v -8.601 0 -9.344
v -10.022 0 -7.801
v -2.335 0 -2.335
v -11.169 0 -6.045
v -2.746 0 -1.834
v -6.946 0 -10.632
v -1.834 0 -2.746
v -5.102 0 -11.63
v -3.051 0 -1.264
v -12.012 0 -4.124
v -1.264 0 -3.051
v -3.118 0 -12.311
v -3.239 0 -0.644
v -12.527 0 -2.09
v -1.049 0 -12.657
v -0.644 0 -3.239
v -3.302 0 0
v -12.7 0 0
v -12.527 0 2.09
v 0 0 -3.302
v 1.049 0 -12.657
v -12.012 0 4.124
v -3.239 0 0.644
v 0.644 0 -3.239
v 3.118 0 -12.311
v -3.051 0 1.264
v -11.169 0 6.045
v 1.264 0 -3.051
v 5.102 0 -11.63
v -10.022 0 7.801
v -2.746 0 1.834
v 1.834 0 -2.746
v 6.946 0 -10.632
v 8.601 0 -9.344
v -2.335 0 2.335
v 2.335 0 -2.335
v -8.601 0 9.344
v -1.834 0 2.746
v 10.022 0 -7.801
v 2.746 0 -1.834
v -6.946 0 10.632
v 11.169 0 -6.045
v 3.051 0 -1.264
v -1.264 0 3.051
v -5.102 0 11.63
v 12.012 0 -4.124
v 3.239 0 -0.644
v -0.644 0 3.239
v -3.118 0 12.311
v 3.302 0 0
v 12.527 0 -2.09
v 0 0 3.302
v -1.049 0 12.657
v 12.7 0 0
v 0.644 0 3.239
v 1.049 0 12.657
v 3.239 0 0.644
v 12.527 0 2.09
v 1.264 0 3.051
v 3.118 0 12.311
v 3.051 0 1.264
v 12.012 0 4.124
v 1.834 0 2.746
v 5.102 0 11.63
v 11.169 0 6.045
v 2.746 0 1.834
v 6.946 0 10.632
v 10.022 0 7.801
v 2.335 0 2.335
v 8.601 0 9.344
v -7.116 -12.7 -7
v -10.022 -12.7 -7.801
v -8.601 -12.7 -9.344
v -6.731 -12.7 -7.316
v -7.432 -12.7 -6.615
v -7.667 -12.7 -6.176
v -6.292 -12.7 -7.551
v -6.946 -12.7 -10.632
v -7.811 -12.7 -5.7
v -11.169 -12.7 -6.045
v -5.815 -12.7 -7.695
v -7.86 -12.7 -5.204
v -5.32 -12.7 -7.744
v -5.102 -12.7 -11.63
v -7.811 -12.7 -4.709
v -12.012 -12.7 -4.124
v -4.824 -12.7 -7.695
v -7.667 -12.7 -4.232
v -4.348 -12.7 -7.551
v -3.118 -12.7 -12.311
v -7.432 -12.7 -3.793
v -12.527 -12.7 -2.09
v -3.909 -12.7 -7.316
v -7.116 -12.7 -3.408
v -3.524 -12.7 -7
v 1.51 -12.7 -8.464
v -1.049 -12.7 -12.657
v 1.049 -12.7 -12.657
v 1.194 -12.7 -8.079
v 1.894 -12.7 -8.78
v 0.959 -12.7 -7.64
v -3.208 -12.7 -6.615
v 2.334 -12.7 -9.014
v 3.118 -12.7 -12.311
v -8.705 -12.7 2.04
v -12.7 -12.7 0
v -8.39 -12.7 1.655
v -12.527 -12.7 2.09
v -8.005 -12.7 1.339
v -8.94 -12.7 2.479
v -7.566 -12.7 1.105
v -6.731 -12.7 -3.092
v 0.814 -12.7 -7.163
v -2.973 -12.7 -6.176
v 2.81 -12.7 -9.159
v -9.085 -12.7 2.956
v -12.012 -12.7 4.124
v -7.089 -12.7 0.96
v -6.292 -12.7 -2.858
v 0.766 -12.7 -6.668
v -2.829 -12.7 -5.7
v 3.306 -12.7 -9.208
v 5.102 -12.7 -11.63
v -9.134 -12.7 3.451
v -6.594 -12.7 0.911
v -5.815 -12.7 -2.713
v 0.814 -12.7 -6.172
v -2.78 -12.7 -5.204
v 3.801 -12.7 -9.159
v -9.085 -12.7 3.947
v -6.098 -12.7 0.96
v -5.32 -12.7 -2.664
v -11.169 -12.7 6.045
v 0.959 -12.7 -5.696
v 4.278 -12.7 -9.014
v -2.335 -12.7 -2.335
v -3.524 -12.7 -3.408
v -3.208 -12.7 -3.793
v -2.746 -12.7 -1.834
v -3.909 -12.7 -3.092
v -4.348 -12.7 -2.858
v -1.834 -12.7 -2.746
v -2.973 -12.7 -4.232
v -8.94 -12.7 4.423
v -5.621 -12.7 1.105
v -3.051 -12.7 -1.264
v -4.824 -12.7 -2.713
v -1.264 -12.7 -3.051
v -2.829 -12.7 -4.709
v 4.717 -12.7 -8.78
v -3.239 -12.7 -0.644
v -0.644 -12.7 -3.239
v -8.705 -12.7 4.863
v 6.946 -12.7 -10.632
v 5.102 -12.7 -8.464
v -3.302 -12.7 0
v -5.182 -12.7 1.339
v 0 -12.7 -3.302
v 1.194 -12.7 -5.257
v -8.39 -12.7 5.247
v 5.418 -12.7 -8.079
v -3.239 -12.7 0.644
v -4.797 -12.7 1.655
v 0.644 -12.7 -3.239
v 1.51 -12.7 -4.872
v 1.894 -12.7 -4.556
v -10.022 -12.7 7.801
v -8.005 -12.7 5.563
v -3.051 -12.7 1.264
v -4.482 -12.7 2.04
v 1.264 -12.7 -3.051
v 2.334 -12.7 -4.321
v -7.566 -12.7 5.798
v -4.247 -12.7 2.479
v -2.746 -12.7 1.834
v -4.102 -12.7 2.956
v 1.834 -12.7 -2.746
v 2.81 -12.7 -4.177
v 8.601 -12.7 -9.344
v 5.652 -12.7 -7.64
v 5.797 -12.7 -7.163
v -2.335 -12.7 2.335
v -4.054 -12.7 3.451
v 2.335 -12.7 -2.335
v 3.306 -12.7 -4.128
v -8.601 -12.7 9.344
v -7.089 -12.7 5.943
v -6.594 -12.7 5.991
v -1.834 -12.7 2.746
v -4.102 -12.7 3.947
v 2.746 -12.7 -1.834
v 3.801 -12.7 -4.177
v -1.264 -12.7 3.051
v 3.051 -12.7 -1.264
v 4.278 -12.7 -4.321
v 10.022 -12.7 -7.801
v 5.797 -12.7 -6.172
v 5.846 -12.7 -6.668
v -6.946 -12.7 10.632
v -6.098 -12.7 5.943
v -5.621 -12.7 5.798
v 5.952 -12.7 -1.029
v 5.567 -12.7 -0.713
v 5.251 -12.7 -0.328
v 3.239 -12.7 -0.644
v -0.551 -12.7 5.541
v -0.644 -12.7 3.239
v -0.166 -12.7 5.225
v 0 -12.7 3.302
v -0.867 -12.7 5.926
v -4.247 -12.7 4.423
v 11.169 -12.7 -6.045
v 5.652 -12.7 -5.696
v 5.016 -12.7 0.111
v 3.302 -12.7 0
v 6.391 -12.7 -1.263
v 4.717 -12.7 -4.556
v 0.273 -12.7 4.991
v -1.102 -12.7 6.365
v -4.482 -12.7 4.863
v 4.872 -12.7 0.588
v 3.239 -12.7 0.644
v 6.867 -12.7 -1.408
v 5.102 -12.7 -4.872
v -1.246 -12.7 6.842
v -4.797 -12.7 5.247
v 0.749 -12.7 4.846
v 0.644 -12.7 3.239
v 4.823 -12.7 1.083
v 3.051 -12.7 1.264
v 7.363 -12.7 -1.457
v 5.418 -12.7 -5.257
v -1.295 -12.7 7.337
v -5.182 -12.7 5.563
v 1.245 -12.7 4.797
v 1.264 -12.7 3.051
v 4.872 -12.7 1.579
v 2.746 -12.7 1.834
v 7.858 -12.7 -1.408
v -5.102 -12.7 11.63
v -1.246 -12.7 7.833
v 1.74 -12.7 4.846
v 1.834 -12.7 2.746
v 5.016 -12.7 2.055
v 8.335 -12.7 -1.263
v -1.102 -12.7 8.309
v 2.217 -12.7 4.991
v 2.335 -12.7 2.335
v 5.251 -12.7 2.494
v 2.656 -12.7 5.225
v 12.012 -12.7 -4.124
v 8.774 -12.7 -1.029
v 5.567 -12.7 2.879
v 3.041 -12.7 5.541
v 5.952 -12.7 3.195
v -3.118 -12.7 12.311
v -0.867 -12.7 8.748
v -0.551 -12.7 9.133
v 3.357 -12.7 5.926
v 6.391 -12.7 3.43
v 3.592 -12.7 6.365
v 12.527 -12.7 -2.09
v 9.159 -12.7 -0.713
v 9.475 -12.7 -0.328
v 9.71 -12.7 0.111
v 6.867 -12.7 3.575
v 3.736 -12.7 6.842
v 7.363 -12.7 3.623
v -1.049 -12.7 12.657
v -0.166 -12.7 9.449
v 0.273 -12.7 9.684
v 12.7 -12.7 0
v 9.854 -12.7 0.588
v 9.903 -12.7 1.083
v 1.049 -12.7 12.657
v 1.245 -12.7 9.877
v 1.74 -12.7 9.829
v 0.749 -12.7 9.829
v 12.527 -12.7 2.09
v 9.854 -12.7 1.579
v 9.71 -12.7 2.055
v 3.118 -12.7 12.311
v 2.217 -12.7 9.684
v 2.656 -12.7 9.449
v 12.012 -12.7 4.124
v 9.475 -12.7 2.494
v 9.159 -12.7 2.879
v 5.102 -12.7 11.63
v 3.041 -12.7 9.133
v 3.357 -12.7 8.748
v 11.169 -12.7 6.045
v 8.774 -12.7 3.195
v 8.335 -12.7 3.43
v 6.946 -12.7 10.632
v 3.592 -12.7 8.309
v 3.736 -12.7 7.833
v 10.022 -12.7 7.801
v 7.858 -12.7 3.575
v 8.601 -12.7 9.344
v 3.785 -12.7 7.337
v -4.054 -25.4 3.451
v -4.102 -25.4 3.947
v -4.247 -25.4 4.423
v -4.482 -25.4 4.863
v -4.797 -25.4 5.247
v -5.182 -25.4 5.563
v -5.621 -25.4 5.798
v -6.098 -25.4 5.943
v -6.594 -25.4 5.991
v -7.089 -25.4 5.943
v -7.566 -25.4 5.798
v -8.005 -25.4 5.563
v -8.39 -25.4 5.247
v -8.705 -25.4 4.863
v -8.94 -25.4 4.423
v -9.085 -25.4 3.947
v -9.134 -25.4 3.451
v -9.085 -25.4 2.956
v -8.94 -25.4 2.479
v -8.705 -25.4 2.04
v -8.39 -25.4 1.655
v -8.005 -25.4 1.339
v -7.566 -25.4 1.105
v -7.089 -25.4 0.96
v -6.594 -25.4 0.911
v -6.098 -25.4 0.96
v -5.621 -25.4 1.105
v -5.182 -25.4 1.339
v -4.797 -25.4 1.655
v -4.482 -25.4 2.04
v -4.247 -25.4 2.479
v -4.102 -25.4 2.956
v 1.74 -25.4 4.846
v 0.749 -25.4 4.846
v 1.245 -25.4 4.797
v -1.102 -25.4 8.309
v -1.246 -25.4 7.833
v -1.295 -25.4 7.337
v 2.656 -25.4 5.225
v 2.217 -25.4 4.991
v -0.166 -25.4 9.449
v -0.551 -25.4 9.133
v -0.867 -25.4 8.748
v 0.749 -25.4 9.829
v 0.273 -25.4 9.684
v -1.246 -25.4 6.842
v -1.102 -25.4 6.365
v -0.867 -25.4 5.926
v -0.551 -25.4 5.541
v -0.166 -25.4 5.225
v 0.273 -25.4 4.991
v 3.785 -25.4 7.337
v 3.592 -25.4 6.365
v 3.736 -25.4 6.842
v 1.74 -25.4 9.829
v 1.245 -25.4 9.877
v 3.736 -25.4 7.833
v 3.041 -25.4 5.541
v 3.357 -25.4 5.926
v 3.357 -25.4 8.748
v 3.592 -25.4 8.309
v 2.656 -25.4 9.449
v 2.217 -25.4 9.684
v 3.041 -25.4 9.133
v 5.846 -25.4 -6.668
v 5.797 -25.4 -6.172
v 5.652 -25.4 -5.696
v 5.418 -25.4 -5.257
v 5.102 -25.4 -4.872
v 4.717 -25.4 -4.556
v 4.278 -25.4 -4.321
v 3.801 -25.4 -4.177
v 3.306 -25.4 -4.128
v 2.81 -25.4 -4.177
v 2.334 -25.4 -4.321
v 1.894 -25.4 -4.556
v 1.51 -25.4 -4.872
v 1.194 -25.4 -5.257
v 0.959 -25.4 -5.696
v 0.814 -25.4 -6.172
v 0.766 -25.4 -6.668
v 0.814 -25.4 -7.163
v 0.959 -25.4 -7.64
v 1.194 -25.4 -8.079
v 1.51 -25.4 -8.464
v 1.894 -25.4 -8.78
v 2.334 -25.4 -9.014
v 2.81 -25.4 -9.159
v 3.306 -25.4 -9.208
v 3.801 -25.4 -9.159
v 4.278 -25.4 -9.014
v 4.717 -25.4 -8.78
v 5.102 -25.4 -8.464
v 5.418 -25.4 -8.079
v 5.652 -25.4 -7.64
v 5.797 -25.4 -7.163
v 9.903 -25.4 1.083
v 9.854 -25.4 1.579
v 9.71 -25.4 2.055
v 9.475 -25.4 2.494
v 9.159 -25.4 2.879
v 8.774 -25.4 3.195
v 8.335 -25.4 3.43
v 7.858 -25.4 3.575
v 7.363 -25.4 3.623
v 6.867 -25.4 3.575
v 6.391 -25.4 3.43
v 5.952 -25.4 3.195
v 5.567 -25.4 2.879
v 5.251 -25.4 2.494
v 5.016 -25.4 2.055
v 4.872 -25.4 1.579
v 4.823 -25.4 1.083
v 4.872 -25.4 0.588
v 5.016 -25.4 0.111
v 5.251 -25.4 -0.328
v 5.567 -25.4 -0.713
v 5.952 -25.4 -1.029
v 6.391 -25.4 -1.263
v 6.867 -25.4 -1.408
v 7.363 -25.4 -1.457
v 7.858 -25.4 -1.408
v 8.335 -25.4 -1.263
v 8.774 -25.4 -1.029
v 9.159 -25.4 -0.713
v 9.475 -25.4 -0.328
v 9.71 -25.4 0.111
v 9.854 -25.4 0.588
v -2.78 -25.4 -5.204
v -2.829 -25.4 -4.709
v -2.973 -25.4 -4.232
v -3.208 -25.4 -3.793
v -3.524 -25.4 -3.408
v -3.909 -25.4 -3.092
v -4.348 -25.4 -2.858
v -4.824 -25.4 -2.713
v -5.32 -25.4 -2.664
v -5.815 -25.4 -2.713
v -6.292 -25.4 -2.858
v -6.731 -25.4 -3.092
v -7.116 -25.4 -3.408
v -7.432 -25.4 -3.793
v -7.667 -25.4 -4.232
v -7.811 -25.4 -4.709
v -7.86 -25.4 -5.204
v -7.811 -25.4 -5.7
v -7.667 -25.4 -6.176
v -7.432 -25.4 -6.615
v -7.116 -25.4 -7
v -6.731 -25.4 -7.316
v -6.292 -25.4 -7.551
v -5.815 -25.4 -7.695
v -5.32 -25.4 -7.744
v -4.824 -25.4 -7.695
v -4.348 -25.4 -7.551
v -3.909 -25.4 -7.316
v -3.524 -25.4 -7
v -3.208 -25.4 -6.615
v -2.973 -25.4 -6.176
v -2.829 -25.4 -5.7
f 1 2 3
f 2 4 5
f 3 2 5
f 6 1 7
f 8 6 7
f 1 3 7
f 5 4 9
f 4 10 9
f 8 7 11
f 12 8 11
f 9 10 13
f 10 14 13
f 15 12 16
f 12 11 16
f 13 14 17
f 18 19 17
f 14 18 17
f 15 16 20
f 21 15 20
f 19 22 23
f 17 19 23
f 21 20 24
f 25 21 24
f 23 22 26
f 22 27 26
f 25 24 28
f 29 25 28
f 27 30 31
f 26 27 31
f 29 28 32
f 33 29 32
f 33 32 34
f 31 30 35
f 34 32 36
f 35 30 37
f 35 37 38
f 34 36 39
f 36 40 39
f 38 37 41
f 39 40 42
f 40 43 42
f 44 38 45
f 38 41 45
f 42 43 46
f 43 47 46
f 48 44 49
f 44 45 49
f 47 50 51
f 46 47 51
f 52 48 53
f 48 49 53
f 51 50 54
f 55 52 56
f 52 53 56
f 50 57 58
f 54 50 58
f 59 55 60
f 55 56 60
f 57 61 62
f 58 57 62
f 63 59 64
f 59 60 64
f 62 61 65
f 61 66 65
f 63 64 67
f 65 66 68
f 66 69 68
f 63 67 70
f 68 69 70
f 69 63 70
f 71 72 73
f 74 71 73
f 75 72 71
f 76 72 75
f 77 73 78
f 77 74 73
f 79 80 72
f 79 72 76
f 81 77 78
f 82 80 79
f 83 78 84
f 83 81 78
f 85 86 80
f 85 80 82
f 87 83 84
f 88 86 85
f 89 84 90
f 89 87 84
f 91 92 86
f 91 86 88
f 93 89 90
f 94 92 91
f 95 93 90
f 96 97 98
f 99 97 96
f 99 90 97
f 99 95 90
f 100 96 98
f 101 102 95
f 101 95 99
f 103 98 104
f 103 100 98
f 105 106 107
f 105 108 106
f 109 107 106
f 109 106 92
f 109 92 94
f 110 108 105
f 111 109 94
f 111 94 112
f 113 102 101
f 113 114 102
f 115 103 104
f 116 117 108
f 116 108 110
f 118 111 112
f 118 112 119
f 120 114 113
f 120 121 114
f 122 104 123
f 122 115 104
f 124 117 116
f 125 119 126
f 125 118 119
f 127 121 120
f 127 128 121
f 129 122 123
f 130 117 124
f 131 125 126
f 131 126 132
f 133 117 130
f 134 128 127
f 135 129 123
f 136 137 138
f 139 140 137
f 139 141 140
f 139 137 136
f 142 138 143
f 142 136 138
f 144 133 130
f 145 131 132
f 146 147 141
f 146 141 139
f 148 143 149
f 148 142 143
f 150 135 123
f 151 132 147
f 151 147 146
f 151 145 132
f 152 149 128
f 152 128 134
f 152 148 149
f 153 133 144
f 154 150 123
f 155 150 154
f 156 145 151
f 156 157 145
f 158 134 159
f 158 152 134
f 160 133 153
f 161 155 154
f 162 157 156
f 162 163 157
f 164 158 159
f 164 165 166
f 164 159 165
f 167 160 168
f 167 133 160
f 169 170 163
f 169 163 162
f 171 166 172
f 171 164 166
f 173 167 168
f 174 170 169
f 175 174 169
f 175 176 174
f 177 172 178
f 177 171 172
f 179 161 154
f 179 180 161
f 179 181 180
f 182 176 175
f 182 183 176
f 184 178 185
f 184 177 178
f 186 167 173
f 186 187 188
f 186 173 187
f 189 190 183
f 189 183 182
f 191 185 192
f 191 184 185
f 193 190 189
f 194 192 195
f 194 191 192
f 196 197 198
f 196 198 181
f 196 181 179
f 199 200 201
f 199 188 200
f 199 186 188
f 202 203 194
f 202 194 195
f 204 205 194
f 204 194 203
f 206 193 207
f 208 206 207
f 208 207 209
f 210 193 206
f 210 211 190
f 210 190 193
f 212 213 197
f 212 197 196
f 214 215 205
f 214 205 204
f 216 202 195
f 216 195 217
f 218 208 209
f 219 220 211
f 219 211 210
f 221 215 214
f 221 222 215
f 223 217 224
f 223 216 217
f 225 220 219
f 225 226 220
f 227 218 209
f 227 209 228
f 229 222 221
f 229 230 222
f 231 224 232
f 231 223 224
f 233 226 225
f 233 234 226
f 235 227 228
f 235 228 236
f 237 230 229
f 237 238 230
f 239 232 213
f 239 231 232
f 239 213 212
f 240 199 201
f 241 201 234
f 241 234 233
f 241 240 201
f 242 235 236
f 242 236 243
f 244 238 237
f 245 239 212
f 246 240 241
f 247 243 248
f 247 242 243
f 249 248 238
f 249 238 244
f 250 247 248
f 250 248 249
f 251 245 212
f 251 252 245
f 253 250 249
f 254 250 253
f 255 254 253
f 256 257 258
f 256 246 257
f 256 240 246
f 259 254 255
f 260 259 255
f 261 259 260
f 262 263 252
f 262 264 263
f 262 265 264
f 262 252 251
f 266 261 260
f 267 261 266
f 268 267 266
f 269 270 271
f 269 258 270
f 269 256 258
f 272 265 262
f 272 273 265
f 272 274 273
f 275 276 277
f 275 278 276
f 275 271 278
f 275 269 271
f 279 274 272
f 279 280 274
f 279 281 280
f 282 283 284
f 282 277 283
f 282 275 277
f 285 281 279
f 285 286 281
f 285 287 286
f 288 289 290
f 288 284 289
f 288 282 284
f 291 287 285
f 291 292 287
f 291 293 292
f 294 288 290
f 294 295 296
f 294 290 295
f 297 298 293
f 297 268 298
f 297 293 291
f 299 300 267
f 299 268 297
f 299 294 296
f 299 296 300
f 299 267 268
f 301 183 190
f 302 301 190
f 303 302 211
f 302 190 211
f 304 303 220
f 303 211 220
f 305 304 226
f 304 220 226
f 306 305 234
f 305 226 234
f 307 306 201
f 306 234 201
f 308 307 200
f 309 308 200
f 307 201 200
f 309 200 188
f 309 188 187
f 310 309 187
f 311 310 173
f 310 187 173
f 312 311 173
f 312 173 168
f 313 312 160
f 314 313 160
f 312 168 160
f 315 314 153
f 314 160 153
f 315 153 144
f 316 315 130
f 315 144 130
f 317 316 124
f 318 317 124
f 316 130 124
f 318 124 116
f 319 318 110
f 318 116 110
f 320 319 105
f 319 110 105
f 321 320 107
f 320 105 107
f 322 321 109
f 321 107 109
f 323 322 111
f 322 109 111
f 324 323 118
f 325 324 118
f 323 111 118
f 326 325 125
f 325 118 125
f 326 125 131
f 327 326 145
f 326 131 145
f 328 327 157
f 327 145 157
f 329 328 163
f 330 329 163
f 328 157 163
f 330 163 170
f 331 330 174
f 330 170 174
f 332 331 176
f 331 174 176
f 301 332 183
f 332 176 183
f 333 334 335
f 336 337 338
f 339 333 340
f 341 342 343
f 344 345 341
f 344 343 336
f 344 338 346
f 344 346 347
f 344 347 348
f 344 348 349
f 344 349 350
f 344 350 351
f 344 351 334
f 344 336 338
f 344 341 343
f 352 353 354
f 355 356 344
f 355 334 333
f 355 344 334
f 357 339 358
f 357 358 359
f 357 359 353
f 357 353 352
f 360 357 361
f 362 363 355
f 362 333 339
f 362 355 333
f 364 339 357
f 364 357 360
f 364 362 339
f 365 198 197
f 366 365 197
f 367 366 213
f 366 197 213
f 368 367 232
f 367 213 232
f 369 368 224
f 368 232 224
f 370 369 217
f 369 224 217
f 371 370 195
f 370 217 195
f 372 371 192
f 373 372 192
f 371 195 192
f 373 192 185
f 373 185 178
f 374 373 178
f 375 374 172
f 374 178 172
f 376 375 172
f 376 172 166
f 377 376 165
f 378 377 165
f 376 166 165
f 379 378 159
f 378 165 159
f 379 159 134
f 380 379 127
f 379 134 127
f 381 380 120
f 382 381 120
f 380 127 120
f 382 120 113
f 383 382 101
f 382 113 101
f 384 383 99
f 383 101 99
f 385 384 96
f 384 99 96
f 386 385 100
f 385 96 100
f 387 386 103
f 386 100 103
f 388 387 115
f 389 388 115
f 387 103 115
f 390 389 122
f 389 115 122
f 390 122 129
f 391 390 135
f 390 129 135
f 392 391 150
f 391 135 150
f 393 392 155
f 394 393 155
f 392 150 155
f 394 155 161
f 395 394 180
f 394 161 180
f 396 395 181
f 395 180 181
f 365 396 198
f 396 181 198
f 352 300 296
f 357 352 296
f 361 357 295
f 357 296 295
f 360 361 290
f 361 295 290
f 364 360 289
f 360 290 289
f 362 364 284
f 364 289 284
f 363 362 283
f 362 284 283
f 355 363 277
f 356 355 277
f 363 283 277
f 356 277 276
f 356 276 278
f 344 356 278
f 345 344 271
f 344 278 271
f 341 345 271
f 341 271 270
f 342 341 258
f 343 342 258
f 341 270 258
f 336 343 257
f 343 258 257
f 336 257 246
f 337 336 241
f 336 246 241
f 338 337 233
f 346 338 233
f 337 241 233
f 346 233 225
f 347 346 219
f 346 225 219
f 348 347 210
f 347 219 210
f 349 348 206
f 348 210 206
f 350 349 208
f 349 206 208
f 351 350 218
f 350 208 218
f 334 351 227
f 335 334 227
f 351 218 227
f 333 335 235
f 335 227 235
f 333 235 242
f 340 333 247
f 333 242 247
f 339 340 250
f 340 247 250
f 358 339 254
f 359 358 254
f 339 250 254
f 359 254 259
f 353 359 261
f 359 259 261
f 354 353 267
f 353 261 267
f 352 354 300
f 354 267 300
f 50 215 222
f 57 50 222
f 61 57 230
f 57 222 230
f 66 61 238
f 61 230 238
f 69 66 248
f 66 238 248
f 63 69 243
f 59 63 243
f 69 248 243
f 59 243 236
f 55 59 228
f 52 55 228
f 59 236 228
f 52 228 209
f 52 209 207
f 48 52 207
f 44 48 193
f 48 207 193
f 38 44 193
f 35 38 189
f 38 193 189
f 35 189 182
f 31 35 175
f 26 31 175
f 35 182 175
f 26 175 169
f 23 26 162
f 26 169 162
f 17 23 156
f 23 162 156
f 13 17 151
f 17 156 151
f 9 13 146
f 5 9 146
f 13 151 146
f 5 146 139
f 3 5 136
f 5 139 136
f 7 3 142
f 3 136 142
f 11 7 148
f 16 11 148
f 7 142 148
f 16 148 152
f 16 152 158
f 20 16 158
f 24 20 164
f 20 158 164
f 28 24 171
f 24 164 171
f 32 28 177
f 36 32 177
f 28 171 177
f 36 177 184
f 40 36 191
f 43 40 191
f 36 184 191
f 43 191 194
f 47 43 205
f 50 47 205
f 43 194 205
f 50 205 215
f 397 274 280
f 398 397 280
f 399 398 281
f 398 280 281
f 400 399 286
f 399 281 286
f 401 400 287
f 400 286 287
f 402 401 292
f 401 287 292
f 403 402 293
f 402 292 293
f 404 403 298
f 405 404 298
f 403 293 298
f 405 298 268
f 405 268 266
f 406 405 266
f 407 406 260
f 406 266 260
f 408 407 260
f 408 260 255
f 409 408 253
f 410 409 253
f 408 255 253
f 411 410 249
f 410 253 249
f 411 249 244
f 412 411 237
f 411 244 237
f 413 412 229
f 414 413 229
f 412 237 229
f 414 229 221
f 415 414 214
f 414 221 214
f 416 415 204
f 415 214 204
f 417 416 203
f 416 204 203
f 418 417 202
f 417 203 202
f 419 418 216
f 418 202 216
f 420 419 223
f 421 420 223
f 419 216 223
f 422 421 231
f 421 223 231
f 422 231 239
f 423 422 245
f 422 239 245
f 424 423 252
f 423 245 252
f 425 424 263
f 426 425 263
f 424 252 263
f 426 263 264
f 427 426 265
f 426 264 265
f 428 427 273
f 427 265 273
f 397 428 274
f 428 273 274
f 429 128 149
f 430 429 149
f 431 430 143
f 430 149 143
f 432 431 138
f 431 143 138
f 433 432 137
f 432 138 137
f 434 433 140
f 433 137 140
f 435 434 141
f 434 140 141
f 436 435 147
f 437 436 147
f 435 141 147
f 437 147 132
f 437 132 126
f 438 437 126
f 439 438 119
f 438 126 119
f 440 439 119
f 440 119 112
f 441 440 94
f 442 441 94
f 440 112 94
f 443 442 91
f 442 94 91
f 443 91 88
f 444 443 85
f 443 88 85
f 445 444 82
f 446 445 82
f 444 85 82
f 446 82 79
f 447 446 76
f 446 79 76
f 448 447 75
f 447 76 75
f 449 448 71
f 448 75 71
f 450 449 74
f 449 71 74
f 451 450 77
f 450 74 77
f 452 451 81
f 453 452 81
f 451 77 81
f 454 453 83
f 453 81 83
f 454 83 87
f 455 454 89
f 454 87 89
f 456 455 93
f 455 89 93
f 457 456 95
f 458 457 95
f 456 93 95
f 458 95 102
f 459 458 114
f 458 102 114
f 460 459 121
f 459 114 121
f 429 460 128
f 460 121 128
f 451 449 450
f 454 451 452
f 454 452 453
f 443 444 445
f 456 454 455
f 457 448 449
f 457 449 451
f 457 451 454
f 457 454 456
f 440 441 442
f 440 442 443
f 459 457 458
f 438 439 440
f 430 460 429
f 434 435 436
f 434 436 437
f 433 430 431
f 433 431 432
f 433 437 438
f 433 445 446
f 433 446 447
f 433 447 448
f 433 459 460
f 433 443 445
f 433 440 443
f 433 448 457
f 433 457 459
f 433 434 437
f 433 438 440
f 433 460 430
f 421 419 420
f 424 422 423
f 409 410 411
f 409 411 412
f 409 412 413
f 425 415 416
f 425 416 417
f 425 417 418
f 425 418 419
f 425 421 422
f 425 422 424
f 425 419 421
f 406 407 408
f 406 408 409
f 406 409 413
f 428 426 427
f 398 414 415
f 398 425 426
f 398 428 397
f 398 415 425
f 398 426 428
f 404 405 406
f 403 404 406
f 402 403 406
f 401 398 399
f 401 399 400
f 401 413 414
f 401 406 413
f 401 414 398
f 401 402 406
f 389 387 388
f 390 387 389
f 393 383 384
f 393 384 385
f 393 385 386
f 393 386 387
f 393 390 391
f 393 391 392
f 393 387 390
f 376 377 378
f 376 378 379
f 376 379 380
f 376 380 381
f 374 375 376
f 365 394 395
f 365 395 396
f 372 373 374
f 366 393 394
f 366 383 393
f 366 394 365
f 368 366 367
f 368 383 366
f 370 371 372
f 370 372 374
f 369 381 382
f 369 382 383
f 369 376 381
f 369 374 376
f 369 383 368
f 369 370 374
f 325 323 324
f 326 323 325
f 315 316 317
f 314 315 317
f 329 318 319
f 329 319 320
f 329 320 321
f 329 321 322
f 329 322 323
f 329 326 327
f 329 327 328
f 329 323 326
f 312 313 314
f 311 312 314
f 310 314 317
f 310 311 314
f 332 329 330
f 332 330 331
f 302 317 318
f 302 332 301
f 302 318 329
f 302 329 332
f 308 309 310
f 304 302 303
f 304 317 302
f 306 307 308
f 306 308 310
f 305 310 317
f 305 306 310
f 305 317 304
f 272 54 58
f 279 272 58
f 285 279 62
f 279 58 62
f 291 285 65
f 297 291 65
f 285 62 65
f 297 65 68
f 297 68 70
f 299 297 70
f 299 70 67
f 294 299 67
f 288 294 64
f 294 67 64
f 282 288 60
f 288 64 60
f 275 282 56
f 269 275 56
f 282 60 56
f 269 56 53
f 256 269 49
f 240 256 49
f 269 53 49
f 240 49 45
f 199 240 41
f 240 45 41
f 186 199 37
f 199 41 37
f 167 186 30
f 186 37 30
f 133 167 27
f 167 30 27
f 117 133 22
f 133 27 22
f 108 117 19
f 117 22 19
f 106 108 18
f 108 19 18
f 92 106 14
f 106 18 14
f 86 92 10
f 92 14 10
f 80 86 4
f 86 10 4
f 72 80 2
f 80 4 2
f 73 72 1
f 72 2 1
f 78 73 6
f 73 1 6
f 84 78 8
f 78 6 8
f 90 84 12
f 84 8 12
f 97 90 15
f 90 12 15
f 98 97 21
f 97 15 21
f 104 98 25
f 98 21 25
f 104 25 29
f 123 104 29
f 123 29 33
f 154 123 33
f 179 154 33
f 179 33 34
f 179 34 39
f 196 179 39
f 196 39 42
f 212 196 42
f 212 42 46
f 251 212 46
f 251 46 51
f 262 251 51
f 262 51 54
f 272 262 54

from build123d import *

# Parameters (mm, degrees)
F0_R     = 12.7
F1_DEPTH = 12.7
F2_R     = 3.302
F3_DEPTH = 12.7
F4_R     = 2.54
F5_DEPTH = 12.7


with BuildPart() as f1:
    # F0 (on Front) → F1 (new body)
    with BuildSketch(Plane.XZ):
        Circle(F0_R)
    extrude(amount=F1_DEPTH)

    # F2 (on face) → F3 (cut)
    with BuildSketch(Plane.XZ.offset(12.7)):
        Circle(F2_R)
    extrude(amount=-F3_DEPTH, mode=Mode.SUBTRACT)

    # F4 (on face) → F5 (join)
    with BuildSketch(Plane.XZ.offset(12.7)):
        with Locations((1.24495, 7.337332)):
            Circle(F4_R)
        with Locations((-6.593507, 3.451378)):
            Circle(F4_R)
        with Locations((-5.319961, -5.204263)):
            Circle(F4_R)
        with Locations((3.30559, -6.66779)):
            Circle(F4_R)
        with Locations((7.362928, 1.083342)):
            Circle(F4_R)
    extrude(amount=F5_DEPTH)


solid = f1.part
